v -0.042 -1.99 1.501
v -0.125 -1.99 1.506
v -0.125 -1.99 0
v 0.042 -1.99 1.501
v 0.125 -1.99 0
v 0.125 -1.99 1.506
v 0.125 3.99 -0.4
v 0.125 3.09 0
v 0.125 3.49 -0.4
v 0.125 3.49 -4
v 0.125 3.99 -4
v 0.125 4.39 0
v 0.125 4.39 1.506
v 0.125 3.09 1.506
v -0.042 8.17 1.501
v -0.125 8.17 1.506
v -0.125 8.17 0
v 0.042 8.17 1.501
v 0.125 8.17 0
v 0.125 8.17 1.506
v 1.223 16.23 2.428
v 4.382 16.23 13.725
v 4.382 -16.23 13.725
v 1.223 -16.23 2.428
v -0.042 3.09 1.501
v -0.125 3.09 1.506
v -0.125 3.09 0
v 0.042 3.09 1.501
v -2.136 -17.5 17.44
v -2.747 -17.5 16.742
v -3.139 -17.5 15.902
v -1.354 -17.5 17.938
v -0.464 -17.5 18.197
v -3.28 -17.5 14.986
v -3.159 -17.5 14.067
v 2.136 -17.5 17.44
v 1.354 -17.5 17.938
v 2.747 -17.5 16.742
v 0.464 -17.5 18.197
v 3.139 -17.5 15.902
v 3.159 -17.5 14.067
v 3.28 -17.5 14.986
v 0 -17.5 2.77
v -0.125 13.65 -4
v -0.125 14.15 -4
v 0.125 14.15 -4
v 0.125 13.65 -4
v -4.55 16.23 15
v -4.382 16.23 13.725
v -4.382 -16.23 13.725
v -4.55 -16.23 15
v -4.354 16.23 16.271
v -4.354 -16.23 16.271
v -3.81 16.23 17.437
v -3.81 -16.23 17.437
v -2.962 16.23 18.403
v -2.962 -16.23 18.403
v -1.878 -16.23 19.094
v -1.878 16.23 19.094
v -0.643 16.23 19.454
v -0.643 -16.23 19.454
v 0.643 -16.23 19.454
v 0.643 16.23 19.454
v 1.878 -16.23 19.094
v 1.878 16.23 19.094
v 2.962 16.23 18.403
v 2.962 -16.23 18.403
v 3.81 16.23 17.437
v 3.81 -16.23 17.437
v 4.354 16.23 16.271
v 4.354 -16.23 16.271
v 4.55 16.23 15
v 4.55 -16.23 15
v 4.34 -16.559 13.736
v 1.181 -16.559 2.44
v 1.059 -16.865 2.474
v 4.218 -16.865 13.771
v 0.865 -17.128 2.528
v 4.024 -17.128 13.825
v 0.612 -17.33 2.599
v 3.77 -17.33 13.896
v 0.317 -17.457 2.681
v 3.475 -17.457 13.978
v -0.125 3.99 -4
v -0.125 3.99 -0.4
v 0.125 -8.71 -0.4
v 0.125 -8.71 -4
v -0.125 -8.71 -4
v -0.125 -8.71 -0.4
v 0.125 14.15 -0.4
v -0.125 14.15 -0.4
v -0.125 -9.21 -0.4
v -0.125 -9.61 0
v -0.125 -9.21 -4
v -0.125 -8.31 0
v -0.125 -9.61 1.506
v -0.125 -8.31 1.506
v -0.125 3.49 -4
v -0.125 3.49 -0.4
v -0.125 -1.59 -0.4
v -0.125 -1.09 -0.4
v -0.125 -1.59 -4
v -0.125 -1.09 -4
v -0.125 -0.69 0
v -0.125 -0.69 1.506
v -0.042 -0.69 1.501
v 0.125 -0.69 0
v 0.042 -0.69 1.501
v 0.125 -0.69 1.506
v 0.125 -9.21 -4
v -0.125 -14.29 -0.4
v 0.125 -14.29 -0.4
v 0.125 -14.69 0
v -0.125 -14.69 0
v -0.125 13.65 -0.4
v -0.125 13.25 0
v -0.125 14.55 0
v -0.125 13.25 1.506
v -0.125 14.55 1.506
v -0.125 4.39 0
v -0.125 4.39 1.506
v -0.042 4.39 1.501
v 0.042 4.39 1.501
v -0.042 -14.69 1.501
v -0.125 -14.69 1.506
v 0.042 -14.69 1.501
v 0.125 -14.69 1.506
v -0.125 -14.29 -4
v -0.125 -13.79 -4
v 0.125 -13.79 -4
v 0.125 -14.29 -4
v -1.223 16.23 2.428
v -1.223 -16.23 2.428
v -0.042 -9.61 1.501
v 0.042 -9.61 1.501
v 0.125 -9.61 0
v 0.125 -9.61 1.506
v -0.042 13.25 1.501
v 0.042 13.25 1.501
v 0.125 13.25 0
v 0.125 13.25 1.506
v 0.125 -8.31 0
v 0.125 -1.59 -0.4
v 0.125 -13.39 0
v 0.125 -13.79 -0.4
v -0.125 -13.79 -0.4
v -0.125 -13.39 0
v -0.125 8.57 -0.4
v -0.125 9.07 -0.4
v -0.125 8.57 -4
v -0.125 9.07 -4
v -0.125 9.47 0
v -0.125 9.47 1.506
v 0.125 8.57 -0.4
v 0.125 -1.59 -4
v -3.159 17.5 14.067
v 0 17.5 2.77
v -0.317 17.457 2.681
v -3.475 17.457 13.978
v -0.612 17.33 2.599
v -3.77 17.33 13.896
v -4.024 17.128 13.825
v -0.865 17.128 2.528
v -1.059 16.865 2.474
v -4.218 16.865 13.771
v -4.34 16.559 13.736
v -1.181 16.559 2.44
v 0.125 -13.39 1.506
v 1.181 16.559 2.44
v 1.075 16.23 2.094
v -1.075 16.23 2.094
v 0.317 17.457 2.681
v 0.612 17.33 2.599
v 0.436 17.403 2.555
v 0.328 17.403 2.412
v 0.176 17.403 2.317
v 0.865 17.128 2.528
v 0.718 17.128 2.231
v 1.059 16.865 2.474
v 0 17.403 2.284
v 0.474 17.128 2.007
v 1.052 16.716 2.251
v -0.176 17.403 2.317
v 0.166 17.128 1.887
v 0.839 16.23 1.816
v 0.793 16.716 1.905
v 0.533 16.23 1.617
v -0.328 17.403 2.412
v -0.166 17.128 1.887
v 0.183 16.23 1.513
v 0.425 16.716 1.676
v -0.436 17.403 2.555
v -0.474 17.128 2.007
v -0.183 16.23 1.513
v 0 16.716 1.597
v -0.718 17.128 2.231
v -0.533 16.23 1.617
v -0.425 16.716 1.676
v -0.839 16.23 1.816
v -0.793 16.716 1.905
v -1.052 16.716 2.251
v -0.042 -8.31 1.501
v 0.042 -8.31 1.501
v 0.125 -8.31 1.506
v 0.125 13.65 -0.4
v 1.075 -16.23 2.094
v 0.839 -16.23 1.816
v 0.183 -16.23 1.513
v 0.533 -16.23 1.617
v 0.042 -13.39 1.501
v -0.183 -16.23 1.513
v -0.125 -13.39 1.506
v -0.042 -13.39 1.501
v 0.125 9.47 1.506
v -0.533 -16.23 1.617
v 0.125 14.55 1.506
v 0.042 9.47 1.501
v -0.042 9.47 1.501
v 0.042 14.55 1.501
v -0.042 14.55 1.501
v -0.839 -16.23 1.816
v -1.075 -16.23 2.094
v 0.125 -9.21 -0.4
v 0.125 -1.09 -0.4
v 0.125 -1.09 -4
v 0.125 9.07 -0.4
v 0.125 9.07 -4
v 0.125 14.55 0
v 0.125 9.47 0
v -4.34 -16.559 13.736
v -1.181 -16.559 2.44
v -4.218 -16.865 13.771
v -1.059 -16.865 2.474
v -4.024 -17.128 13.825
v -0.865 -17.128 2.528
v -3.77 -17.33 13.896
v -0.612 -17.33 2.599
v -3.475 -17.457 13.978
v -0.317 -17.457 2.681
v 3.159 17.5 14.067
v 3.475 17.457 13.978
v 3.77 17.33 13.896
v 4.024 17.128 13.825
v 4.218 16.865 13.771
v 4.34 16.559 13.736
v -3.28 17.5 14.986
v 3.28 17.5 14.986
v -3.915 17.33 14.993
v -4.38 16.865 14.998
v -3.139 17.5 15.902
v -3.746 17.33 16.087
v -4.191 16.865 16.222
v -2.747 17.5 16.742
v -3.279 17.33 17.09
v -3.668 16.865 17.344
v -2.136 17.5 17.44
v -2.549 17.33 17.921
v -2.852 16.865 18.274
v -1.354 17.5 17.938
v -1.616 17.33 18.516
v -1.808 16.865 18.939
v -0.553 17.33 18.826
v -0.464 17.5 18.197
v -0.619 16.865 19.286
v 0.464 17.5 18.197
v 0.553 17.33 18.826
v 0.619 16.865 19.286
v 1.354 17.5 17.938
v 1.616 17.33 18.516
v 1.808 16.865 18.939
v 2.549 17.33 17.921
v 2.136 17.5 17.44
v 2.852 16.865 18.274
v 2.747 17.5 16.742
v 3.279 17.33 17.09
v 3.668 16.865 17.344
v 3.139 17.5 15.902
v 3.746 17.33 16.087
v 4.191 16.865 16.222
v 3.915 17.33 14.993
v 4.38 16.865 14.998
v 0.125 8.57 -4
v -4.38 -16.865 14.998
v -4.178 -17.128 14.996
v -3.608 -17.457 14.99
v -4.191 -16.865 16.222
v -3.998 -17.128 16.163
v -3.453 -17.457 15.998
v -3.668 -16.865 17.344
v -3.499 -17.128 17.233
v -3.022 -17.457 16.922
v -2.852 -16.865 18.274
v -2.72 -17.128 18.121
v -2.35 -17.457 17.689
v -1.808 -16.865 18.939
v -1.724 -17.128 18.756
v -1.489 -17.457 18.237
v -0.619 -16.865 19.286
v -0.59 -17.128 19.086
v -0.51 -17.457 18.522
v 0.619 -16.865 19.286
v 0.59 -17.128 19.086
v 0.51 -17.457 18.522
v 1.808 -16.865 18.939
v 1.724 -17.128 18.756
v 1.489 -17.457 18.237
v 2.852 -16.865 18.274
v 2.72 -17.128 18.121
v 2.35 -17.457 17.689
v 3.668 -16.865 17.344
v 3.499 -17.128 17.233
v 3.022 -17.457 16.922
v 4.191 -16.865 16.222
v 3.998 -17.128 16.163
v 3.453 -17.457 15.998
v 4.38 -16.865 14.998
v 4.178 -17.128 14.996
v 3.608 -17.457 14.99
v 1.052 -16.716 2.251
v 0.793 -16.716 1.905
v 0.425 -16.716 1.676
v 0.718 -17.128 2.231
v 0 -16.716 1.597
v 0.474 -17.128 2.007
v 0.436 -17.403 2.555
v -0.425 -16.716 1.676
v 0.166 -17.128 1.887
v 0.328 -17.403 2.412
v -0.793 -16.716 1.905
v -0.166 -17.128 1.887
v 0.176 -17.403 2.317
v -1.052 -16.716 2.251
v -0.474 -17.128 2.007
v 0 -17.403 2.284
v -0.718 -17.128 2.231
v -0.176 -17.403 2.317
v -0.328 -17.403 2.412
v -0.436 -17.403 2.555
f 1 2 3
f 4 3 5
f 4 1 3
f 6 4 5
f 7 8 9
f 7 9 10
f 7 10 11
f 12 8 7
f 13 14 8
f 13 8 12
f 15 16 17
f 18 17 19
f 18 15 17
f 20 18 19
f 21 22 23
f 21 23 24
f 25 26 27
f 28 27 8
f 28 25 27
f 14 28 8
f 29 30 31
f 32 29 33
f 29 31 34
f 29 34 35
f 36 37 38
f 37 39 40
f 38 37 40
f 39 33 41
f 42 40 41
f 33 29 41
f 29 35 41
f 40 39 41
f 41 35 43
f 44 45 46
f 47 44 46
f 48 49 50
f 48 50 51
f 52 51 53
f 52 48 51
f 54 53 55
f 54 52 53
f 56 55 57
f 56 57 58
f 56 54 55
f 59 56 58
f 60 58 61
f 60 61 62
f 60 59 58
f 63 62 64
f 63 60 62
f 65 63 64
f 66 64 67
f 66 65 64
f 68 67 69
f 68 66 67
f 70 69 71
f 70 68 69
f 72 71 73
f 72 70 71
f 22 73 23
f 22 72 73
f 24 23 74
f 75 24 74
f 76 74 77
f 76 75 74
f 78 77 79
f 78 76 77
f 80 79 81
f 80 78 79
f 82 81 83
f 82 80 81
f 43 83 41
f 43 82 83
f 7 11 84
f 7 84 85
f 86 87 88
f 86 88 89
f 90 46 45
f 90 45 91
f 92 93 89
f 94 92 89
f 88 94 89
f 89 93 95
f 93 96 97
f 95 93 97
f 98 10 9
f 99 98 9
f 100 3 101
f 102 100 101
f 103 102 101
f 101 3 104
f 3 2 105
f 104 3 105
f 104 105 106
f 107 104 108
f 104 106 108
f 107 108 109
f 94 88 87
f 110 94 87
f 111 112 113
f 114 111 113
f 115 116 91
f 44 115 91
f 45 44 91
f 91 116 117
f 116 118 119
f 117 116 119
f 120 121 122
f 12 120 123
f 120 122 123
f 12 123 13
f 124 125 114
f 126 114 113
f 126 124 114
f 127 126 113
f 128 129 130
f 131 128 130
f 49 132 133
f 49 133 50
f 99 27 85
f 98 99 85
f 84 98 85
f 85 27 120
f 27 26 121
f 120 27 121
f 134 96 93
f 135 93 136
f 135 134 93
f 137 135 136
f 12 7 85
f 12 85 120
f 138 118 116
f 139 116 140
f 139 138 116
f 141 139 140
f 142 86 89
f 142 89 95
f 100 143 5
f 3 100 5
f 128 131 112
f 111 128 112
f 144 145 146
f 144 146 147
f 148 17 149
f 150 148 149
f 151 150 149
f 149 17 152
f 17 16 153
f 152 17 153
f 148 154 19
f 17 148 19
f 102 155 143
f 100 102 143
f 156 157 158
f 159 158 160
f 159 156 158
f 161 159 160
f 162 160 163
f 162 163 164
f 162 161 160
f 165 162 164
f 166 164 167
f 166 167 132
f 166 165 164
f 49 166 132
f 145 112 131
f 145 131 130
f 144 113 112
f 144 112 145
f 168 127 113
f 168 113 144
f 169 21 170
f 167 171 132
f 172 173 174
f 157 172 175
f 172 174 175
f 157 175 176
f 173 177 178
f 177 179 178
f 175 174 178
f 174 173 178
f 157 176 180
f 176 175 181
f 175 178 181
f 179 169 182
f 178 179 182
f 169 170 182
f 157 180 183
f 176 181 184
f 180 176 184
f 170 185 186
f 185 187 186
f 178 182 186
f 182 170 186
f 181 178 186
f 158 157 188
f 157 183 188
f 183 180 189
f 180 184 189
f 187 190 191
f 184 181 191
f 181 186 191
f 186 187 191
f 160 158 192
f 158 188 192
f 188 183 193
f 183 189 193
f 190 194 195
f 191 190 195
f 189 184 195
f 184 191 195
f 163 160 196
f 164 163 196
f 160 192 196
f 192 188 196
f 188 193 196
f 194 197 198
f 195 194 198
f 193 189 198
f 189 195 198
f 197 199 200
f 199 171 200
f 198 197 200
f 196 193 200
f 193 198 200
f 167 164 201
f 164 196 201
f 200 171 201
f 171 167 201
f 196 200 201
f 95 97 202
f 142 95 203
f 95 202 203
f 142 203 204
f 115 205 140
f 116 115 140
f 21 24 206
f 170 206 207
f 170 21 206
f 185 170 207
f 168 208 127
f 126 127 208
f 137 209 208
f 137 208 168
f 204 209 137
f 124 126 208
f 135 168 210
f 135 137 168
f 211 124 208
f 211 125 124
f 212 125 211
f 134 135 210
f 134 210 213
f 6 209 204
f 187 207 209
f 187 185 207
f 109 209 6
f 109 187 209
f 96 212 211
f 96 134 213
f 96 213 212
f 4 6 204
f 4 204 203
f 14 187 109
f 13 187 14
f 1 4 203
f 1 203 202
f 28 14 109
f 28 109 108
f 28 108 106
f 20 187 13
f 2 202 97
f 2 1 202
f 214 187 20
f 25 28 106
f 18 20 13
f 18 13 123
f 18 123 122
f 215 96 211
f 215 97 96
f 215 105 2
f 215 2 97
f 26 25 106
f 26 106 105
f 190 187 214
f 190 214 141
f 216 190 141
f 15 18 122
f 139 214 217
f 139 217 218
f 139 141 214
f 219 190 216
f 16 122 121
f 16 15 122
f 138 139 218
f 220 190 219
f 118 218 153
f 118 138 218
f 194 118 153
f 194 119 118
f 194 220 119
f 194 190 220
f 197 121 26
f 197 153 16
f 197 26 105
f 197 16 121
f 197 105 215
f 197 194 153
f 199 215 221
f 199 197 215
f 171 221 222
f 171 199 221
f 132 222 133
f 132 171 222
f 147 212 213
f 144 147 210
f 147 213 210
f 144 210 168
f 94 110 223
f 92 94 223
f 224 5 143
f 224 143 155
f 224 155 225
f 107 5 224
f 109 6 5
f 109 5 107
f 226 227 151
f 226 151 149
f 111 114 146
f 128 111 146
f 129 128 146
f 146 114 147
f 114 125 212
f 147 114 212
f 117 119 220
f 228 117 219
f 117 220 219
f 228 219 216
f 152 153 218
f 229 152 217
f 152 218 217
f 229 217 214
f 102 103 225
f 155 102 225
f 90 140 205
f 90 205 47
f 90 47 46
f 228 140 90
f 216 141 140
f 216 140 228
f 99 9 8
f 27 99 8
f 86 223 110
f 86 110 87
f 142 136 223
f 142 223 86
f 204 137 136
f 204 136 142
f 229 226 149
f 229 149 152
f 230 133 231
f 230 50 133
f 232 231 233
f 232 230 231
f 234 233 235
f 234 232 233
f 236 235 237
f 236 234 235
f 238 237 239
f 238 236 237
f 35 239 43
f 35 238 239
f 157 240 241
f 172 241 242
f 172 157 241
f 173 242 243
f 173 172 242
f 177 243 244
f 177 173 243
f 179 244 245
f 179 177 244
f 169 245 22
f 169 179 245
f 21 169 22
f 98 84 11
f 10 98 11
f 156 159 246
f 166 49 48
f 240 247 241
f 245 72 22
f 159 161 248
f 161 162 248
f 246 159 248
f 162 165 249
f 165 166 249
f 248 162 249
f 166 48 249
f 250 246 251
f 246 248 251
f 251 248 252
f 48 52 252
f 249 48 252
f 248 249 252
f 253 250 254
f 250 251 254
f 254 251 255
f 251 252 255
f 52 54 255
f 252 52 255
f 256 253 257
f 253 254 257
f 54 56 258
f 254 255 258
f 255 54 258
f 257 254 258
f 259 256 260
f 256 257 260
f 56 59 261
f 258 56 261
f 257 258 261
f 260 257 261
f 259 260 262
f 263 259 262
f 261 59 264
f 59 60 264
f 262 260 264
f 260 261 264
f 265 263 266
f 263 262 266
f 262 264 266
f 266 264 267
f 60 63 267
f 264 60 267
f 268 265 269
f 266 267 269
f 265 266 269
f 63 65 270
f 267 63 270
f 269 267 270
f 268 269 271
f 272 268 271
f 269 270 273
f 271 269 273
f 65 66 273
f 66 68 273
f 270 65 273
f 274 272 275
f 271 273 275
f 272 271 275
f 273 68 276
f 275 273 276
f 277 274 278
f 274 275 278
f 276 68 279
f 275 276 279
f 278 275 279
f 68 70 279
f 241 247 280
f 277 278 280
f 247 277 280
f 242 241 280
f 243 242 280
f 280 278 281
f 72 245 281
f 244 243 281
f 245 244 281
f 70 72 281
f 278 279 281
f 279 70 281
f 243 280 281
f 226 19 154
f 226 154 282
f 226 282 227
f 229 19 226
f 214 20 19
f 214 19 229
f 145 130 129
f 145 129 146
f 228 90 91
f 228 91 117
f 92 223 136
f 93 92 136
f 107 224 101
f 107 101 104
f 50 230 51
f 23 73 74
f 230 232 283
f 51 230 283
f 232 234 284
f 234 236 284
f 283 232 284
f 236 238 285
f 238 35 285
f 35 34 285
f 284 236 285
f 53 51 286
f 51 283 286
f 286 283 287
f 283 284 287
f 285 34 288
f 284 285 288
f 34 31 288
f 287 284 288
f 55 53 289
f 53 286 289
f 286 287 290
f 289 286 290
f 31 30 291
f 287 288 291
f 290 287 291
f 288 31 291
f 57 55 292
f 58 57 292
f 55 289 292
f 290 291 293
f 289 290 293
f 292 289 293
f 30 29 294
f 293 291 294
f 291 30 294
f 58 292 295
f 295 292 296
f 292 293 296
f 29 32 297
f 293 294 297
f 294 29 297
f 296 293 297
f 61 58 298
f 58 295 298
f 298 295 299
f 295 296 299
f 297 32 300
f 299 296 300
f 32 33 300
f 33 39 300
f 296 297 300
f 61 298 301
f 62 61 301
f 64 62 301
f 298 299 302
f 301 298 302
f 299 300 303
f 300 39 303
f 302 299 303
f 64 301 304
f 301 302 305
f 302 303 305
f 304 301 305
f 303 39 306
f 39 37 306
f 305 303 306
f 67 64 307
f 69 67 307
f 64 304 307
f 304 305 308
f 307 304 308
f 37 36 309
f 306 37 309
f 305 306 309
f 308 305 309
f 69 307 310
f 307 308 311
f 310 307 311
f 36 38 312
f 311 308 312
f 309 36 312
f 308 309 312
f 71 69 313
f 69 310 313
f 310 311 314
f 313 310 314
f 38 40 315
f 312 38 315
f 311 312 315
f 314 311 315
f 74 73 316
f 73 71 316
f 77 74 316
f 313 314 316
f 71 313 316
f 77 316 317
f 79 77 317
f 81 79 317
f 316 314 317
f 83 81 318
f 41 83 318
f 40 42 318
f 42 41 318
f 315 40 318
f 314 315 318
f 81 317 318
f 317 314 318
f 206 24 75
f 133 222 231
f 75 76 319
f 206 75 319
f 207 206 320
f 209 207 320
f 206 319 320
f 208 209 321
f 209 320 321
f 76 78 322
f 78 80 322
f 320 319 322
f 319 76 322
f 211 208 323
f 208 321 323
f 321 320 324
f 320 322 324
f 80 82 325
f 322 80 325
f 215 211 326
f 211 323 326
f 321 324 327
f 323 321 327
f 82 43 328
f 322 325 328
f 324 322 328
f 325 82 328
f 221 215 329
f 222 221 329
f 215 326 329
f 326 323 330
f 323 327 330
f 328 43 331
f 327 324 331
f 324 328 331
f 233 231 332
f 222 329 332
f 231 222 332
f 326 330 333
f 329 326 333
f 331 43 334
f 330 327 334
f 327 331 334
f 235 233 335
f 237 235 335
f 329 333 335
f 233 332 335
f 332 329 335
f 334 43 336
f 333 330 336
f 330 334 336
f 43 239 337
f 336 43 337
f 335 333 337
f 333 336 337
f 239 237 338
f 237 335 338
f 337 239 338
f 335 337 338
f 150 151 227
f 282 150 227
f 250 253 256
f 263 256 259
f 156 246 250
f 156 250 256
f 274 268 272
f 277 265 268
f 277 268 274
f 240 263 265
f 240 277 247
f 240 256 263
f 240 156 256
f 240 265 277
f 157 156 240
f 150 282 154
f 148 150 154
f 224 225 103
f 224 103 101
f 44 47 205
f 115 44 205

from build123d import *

# Parameters (mm, degrees)
BOSS_EXTRUDE1_DEPTH = 17.5
FILLET1_R           = 1.27
SKETCH2_W           = 0.25
SKETCH2_H           = 1.3
BOSS_EXTRUDE2_DEPTH = 6
CUT_EXTRUDE1_REACH  = 28.615
LPATTERN1_COUNT     = 4
LPATTERN1_PITCH     = 5.08
SKETCH4_W           = 0.25
SKETCH4_H           = 1.3
BOSS_EXTRUDE3_DEPTH = 6
CUT_EXTRUDE2_REACH  = 28.615
LPATTERN3_COUNT     = 2
LPATTERN3_PITCH     = 5.08


with BuildPart() as part:
    # Sketch1 → Boss-Extrude1 (new, symmetric)
    with BuildSketch(Plane(origin=(0, 0, 0), x_dir=(1, 0, 0), z_dir=(0, 1, 0))):
        with BuildLine():
            Line((-1.223083707, -2.427996716), (-4.381914067, -13.724712644))
            ThreePointArc((-4.381914067, -13.724712644), (0, -19.5), (4.381914067, -13.724712644))
            Line((4.381914067, -13.724712644), (1.223083707, -2.427996716))
            ThreePointArc((1.223083707, -2.427996716), (0, -1.5), (-1.223083707, -2.427996716))
        make_face()
    extrude(amount=BOSS_EXTRUDE1_DEPTH, both=True)

    # Fillet1
    fillet1_edges = [part.edges().sort_by_distance(p)[0] for p in [
        (0, 17.5, 19.5),
        (2.802498887, 17.5, 8.07635468),
        (0, 17.5, 1.5),
        (2.802498887, -17.5, 8.07635468),
        (0, -17.5, 19.5),
        (-2.802498887, -17.5, 8.07635468),
        (0, -17.5, 1.5),
        (-2.802498887, 17.5, 8.07635468),
    ]]
    fillet(fillet1_edges, radius=FILLET1_R)

    # Sketch2 → Boss-Extrude2 (add)
    with BuildSketch(Plane.XY.offset(2)):
        with Locations((0, 13.9)):
            Rectangle(SKETCH2_W, SKETCH2_H)
    boss_extrude2 = extrude(amount=-BOSS_EXTRUDE2_DEPTH)

    # Sketch3 → Cut-Extrude1 (cut, up to next)
    with BuildSketch(Plane(origin=(0.125, 0, 0), x_dir=(0, 0, -1), z_dir=(1, 0, 0)), mode=Mode.PRIVATE) as cut_extrude1_sk1:
        Polygon((4, 14.150000008), (0.399999992, 14.150000008), (0, 14.55), (4, 14.55), align=None)
    cut_extrude1_tool1 = extrude(cut_extrude1_sk1.sketch, amount=-CUT_EXTRUDE1_REACH, mode=Mode.PRIVATE) & part.part
    # Sketch3 → Cut-Extrude1 (cut, up to next)
    with BuildSketch(Plane(origin=(0.125, 0, 0), x_dir=(0, 0, -1), z_dir=(1, 0, 0)), mode=Mode.PRIVATE) as cut_extrude1_sk2:
        Polygon((4, 13.25), (4, 13.649999992), (0.399999992, 13.649999992), (0, 13.25), align=None)
    cut_extrude1_tool2 = extrude(cut_extrude1_sk2.sketch, amount=-CUT_EXTRUDE1_REACH, mode=Mode.PRIVATE) & part.part
    cut_extrude1_1 = cut_extrude1_tool1.solids().sort_by_distance((0.125, 14.353509, -2.098246))[0]
    add(cut_extrude1_1, mode=Mode.SUBTRACT)
    cut_extrude1_2 = cut_extrude1_tool2.solids().sort_by_distance((0.125, 13.446491, -2.098246))[0]
    add(cut_extrude1_2, mode=Mode.SUBTRACT)
    cut_extrude1 = cut_extrude1_1 + cut_extrude1_2  # Cut-Extrude1 as one shape, for the pattern or mirror that repeats it

    # LPattern1: Boss-Extrude2, Cut-Extrude1 ×4
    with Locations(*[(0, -i * LPATTERN1_PITCH, 0) for i in range(1, LPATTERN1_COUNT)]):
        add(boss_extrude2)
        add(cut_extrude1, mode=Mode.SUBTRACT)

    # Sketch4 → Boss-Extrude3 (add)
    with BuildSketch(Plane.XY.offset(2)):
        with Locations((0, -8.96)):
            Rectangle(SKETCH4_W, SKETCH4_H)
    boss_extrude3 = extrude(amount=-BOSS_EXTRUDE3_DEPTH)

    # Sketch5 → Cut-Extrude2 (cut, up to next)
    with BuildSketch(Plane(origin=(0.125, 0, 0), x_dir=(0, 0, -1), z_dir=(1, 0, 0)), mode=Mode.PRIVATE) as cut_extrude2_sk1:
        Polygon((4, -8.709999992), (0.399999992, -8.709999992), (0, -8.31), (4, -8.31), align=None)
    cut_extrude2_tool1 = extrude(cut_extrude2_sk1.sketch, amount=-CUT_EXTRUDE2_REACH, mode=Mode.PRIVATE) & part.part
    # Sketch5 → Cut-Extrude2 (cut, up to next)
    with BuildSketch(Plane(origin=(0.125, 0, 0), x_dir=(0, 0, -1), z_dir=(1, 0, 0)), mode=Mode.PRIVATE) as cut_extrude2_sk2:
        Polygon((4, -9.61), (4, -9.210000008), (0.399999992, -9.210000008), (0, -9.61), align=None)
    cut_extrude2_tool2 = extrude(cut_extrude2_sk2.sketch, amount=-CUT_EXTRUDE2_REACH, mode=Mode.PRIVATE) & part.part
    cut_extrude2_1 = cut_extrude2_tool1.solids().sort_by_distance((0.125, -8.506491, -2.098246))[0]
    add(cut_extrude2_1, mode=Mode.SUBTRACT)
    cut_extrude2_2 = cut_extrude2_tool2.solids().sort_by_distance((0.125, -9.413509, -2.098246))[0]
    add(cut_extrude2_2, mode=Mode.SUBTRACT)
    cut_extrude2 = cut_extrude2_1 + cut_extrude2_2  # Cut-Extrude2 as one shape, for the pattern or mirror that repeats it

    # LPattern3: Boss-Extrude3, Cut-Extrude2 ×2
    with Locations(*[(0, -i * LPATTERN3_PITCH, 0) for i in range(1, LPATTERN3_COUNT)]):
        add(boss_extrude3)
        add(cut_extrude2, mode=Mode.SUBTRACT)


solid = part.part
